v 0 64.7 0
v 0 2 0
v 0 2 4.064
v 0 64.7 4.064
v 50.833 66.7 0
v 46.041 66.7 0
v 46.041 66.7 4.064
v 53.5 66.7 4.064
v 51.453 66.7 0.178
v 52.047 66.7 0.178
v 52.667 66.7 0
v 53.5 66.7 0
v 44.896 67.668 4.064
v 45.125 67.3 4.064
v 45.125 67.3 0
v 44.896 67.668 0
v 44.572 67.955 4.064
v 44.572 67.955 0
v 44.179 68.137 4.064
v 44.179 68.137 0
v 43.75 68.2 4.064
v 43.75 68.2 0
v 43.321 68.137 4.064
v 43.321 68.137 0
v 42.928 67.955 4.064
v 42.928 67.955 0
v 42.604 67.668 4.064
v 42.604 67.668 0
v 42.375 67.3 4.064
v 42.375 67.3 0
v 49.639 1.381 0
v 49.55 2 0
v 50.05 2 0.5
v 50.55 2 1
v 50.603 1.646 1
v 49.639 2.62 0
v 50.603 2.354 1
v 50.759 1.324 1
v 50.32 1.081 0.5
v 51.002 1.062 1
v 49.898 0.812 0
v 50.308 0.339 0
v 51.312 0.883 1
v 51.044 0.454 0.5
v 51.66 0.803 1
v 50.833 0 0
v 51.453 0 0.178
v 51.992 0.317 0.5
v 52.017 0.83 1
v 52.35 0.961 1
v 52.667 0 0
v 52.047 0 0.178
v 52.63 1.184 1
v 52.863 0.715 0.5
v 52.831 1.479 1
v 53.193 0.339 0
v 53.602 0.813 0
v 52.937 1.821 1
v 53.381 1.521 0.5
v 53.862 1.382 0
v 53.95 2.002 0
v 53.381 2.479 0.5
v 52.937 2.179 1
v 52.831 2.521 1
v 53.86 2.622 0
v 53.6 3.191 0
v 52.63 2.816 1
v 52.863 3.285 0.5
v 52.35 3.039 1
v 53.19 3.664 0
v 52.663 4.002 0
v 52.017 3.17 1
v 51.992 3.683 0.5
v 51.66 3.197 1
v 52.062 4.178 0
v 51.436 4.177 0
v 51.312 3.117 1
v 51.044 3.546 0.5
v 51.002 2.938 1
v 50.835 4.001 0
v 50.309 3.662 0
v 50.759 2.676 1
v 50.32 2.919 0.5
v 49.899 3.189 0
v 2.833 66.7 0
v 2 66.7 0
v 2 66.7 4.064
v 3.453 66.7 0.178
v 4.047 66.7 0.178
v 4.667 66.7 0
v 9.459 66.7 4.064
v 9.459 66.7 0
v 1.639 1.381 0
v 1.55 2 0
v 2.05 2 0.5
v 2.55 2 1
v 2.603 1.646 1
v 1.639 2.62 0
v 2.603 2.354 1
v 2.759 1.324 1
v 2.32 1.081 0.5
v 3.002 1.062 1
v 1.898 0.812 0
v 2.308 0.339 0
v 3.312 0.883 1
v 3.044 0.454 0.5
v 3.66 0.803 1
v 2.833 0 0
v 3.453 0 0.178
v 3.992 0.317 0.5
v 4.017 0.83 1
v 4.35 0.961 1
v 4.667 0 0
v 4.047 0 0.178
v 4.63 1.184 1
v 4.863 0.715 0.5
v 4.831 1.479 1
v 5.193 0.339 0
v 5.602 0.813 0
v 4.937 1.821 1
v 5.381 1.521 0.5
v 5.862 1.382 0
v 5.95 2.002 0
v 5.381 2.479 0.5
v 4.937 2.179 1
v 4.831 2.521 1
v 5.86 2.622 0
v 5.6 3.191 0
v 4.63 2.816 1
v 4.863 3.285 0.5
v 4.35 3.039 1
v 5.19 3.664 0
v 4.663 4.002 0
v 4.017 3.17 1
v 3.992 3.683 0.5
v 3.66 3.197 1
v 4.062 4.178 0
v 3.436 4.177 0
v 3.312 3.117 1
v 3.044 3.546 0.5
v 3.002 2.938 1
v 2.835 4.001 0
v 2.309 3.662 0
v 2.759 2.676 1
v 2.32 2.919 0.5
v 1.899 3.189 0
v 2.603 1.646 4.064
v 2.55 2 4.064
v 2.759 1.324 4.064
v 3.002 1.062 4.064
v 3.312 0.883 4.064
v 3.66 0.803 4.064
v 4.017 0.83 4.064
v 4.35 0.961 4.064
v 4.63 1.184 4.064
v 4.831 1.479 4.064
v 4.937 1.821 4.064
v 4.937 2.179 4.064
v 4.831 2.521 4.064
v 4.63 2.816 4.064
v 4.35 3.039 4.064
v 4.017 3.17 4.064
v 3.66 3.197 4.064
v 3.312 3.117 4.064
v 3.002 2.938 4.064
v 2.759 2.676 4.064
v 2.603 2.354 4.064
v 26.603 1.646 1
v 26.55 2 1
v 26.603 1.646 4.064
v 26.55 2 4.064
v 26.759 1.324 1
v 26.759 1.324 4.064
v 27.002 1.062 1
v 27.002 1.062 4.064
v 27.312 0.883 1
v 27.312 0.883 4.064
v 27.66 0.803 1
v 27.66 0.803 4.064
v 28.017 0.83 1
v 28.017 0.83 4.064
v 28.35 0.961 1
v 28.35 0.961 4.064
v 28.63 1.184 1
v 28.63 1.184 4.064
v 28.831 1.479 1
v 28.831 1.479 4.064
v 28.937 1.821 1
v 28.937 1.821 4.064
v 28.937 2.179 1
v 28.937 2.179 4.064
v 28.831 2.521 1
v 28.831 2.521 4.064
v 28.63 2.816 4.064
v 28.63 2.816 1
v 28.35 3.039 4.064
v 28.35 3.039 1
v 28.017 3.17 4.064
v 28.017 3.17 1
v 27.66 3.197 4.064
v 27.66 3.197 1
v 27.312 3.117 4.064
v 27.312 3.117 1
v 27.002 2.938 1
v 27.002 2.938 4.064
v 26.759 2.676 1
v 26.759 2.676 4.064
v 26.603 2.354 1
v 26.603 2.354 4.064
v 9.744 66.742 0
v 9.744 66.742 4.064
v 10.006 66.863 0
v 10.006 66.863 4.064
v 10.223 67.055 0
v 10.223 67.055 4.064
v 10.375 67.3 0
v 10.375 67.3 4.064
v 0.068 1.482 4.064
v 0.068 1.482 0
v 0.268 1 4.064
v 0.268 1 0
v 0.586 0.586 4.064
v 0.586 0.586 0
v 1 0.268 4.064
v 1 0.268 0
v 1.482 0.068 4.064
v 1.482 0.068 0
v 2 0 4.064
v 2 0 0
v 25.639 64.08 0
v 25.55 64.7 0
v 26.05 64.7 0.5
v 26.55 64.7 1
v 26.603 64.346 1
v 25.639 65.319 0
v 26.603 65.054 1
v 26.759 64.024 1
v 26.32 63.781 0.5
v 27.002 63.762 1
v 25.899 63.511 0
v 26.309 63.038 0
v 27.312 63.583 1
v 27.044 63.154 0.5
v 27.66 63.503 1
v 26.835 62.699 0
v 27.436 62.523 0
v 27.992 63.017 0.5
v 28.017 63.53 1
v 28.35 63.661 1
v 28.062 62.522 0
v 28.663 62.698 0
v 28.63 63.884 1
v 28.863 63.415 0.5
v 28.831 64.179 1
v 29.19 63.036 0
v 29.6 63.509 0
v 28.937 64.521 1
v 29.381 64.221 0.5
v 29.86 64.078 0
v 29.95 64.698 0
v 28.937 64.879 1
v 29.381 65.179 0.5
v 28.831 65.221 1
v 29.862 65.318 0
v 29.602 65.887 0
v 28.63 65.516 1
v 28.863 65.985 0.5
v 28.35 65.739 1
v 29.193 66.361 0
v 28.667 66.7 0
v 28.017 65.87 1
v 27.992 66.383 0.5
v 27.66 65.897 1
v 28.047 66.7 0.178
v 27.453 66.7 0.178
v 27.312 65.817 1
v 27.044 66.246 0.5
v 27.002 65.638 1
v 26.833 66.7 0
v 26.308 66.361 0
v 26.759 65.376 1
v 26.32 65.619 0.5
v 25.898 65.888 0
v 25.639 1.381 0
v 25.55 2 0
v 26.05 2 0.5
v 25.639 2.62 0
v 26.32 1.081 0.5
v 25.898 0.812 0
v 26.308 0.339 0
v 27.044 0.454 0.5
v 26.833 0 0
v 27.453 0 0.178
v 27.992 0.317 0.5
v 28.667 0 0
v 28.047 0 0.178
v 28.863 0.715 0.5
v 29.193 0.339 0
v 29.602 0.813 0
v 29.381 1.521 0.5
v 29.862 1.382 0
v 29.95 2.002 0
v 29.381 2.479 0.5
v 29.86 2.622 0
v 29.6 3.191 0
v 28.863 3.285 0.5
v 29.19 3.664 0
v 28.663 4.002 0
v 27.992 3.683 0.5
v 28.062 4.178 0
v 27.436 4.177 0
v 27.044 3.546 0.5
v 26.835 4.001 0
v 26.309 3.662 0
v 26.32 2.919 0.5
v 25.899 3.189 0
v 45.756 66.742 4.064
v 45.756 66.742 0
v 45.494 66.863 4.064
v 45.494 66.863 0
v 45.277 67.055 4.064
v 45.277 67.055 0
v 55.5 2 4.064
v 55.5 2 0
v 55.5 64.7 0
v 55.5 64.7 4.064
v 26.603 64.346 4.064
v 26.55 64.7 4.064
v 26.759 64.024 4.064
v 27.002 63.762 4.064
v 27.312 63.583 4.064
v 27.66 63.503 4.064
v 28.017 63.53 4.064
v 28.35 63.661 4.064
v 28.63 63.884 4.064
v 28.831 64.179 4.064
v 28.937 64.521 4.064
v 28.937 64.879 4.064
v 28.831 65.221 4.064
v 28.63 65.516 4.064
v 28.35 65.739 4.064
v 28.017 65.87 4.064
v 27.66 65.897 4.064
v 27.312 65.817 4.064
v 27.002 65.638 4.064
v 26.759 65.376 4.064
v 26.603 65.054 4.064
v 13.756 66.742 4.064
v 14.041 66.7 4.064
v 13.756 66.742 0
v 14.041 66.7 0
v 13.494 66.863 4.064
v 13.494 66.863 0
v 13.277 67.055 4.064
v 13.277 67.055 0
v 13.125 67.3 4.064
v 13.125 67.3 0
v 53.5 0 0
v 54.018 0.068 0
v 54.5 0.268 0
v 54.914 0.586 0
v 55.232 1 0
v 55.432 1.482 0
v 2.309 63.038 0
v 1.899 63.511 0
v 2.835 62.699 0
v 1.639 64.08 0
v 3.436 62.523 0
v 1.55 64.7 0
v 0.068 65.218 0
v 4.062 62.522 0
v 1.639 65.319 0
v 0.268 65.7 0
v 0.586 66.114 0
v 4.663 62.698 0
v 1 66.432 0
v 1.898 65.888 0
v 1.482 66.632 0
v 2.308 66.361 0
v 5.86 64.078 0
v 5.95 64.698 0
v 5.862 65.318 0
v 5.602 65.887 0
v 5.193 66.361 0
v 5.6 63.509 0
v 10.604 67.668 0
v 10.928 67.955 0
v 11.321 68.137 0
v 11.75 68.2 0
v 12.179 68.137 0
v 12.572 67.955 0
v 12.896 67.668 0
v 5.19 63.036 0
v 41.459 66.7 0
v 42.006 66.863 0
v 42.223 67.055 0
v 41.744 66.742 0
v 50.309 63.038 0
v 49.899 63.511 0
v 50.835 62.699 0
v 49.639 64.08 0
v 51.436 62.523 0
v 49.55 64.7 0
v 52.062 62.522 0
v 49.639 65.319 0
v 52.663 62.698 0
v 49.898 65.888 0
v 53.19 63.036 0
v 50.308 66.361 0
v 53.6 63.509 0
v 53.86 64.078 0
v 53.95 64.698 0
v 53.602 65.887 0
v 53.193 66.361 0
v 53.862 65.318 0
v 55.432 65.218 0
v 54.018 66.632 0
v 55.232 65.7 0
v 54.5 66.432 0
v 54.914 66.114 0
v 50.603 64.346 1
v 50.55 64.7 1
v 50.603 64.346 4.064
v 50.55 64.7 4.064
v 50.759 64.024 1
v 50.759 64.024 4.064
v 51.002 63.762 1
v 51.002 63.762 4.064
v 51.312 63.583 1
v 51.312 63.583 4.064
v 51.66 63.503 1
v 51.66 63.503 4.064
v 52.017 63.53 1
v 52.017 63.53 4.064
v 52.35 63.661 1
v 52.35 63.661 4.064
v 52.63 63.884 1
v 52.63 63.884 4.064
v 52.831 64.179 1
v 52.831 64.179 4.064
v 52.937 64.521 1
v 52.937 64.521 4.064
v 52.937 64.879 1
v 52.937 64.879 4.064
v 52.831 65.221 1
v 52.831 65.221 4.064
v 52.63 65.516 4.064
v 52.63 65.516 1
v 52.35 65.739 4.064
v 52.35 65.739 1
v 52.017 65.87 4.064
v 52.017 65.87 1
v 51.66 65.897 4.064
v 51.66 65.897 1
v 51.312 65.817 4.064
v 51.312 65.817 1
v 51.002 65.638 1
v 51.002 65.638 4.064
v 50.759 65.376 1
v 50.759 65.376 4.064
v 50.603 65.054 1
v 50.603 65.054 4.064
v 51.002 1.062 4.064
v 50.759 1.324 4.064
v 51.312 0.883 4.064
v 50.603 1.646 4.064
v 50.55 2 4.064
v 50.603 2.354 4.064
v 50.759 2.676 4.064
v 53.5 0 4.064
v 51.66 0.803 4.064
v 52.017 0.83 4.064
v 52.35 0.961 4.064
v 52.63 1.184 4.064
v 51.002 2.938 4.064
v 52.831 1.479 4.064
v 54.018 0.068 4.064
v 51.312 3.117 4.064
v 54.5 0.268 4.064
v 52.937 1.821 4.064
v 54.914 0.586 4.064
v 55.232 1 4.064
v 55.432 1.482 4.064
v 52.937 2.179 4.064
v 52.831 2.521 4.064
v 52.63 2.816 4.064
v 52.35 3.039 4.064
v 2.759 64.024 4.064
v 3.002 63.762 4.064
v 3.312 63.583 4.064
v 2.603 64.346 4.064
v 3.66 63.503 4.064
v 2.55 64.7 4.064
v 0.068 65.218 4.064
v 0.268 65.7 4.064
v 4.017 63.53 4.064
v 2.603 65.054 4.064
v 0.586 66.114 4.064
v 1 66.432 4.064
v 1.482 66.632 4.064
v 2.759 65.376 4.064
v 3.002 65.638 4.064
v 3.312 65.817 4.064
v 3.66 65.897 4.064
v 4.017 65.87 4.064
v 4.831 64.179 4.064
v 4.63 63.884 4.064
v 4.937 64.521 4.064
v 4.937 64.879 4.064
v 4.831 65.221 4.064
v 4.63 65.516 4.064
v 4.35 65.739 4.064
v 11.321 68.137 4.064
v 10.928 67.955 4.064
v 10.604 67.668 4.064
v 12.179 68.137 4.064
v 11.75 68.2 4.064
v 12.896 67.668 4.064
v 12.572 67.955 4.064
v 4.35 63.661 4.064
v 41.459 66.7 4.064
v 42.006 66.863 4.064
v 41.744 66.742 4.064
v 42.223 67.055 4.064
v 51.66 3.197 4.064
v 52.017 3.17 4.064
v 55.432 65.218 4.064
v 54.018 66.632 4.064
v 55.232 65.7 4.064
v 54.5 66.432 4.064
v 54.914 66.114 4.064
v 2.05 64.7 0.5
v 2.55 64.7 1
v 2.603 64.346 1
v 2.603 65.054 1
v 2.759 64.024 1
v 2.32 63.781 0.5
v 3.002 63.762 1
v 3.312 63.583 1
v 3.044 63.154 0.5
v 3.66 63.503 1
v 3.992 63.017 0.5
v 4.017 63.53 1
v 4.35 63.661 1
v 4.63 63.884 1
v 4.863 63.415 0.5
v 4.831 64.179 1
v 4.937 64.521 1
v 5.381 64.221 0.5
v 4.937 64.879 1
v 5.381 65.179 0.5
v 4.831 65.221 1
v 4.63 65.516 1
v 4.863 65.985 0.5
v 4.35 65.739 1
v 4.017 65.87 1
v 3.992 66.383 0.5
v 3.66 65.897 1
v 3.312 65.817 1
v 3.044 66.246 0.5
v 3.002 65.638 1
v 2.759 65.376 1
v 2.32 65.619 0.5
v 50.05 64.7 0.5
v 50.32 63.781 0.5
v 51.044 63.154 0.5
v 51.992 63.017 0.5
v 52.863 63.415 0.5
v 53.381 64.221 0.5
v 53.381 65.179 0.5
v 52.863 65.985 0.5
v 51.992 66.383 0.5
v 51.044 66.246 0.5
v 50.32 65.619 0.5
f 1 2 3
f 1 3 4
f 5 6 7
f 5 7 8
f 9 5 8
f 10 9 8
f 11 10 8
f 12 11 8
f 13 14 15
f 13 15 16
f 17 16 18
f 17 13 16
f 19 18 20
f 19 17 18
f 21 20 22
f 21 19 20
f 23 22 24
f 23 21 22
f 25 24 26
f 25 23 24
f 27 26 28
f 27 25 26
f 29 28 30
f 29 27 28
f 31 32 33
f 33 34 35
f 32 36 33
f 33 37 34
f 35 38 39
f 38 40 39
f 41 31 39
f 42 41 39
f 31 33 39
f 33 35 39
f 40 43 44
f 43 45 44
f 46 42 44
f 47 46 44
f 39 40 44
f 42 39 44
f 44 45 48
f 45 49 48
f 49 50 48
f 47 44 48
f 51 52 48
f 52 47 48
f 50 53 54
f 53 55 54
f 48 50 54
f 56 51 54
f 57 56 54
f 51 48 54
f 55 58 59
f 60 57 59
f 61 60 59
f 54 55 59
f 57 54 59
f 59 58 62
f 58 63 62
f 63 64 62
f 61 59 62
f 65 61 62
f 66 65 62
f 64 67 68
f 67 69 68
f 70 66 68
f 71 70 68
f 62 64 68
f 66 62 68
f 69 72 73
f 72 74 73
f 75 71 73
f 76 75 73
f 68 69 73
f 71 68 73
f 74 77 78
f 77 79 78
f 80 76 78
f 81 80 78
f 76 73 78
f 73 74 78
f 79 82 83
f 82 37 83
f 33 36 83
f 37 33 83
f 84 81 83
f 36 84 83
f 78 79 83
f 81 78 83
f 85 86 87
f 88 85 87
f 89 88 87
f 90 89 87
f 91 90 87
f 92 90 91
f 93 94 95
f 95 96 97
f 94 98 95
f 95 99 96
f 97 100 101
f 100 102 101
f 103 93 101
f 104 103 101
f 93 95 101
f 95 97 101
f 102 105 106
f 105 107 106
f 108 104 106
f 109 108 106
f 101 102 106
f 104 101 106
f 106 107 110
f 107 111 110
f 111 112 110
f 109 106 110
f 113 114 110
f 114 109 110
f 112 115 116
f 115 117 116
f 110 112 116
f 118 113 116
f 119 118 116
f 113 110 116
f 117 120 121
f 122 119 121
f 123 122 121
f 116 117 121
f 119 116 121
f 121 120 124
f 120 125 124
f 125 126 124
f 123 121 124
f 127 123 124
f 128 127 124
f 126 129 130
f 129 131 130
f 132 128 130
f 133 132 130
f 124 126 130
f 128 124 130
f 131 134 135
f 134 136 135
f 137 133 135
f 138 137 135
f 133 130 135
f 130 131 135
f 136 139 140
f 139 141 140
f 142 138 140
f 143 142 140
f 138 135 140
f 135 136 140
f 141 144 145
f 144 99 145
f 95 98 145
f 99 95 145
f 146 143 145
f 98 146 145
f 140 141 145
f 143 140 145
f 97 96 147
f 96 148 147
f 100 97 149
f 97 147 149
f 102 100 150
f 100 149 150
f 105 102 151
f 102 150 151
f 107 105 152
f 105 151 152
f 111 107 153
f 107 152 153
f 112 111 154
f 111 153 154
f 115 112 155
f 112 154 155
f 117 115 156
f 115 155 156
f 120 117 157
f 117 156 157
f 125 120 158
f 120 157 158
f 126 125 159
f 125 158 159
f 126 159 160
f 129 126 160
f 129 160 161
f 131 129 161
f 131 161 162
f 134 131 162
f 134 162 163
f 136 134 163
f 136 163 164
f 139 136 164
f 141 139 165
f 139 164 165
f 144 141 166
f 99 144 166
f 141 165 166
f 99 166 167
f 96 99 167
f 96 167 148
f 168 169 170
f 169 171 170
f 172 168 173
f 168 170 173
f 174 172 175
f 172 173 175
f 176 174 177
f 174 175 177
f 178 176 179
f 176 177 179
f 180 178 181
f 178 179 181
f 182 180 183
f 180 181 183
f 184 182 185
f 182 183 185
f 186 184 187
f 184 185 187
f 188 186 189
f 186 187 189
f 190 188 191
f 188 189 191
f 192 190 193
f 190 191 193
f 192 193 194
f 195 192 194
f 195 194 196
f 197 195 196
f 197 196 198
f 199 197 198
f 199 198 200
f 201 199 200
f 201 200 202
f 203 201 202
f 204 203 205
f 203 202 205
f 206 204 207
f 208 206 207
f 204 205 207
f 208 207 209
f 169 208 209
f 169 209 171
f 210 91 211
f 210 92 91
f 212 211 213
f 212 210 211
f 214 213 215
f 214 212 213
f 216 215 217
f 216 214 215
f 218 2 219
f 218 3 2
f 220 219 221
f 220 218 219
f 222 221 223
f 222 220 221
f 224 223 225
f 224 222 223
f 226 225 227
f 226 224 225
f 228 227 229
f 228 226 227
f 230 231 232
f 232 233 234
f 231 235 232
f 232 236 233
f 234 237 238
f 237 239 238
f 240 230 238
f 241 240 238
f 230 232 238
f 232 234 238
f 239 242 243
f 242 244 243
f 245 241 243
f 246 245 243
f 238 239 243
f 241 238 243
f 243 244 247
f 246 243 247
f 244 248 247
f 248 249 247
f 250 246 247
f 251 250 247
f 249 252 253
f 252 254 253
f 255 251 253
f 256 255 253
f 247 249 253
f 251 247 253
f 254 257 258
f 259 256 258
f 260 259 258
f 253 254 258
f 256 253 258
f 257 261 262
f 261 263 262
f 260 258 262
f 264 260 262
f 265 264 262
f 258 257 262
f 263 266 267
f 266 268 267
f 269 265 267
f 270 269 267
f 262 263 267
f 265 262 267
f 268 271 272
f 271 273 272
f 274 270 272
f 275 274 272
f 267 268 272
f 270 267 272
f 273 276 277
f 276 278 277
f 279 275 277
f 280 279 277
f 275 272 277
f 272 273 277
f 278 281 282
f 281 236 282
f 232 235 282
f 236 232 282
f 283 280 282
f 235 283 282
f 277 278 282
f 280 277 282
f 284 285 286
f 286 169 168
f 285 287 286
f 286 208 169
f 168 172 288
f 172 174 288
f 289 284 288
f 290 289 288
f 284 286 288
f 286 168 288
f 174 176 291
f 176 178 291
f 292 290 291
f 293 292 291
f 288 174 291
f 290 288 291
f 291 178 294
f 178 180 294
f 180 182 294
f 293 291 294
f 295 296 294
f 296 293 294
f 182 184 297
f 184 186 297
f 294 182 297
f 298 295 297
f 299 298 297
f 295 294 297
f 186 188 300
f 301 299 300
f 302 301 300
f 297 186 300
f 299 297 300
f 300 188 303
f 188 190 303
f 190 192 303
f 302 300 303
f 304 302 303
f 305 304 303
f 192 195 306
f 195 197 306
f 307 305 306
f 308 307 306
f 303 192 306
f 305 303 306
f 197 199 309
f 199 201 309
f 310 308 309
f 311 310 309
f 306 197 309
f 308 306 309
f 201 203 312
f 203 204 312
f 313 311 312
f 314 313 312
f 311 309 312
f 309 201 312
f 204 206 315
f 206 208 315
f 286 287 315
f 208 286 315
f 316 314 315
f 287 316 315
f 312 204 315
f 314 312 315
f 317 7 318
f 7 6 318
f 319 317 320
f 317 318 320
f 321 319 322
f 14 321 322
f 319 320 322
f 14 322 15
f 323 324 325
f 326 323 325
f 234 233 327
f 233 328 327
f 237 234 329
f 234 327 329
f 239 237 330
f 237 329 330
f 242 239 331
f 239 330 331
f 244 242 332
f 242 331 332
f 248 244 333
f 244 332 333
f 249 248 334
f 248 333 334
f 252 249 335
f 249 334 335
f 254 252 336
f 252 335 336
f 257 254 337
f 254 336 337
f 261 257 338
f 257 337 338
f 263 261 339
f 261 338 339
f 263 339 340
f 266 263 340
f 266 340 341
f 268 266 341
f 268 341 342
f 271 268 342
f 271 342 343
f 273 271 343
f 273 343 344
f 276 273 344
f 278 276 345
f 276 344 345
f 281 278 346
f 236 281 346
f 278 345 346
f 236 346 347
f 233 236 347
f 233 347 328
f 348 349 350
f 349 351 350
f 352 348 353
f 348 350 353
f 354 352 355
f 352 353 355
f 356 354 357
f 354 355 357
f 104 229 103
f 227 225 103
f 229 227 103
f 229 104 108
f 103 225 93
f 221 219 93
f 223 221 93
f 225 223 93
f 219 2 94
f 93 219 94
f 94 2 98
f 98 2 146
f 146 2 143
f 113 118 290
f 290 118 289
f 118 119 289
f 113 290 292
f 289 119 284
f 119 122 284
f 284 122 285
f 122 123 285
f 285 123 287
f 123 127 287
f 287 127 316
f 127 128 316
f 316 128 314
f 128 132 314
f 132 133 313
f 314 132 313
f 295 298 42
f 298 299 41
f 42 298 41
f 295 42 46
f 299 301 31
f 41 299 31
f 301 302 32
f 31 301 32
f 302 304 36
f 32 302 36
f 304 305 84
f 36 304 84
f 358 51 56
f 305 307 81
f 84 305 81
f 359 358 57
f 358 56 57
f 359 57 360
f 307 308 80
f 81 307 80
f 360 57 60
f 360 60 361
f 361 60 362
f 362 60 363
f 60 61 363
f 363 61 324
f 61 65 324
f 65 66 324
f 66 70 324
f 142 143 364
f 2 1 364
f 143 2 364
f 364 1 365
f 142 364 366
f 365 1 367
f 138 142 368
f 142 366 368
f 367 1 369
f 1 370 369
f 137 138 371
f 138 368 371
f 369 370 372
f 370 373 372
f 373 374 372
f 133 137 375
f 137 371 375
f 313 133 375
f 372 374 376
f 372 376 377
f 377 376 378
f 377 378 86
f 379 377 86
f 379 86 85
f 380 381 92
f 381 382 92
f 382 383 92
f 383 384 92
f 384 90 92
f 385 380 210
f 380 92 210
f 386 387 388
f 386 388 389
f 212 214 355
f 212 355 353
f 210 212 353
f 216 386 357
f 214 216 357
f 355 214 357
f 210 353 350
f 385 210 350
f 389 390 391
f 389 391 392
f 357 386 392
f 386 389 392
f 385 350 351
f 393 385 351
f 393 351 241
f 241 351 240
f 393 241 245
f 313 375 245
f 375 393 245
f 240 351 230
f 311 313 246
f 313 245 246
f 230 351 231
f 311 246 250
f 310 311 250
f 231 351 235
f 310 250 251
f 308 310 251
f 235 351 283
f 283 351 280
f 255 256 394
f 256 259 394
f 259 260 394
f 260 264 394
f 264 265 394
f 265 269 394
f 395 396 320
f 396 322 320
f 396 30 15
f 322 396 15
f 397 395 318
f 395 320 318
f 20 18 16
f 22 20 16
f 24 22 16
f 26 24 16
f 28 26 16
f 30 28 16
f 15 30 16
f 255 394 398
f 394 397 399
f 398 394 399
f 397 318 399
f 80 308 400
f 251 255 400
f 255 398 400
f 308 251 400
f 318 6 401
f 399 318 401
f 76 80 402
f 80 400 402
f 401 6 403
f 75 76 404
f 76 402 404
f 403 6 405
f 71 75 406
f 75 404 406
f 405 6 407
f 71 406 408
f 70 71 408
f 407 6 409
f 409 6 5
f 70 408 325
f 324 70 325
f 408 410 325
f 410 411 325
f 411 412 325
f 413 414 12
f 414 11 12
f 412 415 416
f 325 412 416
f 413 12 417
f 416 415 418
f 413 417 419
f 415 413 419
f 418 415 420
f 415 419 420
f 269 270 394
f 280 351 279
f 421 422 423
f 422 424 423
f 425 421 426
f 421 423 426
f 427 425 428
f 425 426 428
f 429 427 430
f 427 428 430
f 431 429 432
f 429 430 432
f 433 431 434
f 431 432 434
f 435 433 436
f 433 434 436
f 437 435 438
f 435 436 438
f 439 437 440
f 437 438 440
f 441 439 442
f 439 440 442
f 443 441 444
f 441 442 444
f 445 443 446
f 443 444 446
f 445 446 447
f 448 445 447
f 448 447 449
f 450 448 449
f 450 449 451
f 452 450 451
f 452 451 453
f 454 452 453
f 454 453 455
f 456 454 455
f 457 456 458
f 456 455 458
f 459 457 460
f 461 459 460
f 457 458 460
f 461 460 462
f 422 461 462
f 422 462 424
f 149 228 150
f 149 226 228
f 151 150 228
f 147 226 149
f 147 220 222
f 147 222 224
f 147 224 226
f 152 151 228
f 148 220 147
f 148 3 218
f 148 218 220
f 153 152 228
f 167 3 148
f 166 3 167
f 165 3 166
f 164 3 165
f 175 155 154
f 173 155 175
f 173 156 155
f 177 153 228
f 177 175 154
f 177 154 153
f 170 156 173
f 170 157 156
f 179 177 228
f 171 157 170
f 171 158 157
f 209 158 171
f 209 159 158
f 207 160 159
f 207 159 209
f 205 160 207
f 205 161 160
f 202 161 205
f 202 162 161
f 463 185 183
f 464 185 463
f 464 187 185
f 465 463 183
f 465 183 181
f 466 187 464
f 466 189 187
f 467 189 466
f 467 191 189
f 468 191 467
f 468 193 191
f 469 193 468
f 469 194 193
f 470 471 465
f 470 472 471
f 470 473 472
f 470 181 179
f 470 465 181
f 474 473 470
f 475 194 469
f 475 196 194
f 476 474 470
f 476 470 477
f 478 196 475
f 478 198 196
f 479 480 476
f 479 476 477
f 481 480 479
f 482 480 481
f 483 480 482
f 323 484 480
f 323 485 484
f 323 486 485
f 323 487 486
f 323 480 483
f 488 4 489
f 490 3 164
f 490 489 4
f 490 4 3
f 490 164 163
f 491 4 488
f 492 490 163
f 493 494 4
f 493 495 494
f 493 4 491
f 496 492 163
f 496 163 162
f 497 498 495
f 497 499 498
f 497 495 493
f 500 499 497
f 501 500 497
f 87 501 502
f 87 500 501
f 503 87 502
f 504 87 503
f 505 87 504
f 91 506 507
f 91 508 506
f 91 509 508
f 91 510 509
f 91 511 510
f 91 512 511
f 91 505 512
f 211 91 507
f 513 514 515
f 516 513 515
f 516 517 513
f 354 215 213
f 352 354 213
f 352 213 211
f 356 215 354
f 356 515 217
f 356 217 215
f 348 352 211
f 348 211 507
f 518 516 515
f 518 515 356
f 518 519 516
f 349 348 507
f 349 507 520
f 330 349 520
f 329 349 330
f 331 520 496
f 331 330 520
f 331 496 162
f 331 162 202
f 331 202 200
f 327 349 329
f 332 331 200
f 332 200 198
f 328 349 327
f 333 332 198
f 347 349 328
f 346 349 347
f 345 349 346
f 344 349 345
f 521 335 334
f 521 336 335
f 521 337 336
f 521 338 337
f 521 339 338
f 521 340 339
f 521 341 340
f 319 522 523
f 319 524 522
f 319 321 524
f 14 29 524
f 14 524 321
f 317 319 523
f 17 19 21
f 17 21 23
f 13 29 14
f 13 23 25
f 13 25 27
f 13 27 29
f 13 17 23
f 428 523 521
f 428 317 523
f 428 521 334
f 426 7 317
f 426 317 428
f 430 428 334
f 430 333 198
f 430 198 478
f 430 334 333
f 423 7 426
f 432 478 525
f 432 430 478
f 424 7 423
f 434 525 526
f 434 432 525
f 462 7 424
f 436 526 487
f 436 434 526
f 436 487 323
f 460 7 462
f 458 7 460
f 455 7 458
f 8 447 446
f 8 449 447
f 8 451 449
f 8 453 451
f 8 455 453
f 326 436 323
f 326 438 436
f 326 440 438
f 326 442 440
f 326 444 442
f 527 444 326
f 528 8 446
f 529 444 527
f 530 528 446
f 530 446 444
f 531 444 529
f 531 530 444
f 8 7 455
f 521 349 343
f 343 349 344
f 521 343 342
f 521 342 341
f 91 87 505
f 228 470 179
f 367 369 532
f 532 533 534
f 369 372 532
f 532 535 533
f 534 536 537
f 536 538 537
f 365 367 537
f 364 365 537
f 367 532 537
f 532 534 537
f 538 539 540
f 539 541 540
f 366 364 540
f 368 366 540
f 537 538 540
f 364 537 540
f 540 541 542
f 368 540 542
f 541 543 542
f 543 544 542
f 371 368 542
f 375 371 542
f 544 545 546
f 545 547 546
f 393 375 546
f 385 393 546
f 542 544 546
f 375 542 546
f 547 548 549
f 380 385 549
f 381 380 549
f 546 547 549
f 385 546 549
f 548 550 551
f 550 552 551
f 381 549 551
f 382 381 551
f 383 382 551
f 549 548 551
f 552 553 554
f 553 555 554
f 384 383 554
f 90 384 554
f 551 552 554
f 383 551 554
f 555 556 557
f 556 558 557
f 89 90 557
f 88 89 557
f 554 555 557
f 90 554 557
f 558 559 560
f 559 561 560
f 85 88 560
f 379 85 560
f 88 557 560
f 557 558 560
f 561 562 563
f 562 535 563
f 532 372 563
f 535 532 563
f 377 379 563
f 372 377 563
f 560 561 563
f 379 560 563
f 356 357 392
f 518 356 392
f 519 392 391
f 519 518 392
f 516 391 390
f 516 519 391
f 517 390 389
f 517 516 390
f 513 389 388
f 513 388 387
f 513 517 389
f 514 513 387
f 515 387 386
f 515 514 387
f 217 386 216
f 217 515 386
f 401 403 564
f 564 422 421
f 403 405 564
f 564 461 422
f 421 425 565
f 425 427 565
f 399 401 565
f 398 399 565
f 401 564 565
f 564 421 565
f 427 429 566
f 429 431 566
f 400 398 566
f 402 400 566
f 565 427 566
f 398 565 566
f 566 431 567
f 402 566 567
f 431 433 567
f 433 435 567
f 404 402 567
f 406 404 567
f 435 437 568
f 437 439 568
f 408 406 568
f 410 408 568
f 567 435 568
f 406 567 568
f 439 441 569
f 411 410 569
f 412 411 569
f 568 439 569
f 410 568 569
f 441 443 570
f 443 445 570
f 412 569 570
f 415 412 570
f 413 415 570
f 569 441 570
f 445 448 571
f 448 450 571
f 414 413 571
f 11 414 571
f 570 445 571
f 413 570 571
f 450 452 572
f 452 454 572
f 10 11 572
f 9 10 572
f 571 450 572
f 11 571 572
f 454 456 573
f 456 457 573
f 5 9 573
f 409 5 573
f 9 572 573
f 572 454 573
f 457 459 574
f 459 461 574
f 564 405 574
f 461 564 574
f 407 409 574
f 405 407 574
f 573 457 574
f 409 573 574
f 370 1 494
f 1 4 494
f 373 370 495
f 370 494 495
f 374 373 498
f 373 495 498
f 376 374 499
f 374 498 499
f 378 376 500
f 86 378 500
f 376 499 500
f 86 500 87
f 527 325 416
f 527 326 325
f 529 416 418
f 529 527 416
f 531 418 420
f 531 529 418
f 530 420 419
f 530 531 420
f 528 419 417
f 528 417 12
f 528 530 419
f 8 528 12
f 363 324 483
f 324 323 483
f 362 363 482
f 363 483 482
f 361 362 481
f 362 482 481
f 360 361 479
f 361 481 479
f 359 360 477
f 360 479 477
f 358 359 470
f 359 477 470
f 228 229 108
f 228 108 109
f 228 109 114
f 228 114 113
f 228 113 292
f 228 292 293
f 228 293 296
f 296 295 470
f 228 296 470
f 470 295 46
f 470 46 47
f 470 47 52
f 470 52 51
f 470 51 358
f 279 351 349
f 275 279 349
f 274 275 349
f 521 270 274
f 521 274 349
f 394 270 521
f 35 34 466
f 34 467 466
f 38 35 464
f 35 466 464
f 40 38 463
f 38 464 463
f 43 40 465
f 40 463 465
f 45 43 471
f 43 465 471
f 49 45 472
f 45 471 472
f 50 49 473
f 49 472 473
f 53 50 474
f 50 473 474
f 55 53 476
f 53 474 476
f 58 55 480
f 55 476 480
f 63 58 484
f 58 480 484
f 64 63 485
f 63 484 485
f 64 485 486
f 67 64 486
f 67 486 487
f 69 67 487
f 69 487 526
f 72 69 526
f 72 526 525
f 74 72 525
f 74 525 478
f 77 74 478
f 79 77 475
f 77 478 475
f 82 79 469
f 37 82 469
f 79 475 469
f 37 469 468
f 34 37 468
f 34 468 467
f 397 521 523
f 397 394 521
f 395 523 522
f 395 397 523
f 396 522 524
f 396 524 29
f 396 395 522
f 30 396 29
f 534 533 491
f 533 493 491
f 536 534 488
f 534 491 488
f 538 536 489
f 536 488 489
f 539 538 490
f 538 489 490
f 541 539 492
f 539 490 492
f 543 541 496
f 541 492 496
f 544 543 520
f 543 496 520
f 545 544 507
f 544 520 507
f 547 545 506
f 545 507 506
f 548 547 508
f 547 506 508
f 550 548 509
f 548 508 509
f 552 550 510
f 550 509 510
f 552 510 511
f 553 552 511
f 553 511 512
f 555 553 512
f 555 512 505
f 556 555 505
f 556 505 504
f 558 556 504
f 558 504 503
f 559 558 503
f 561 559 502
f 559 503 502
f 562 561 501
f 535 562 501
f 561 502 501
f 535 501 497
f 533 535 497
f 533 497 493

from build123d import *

# Parameters (mm, degrees)
SKETCH1_W                                       = 55.5
SKETCH1_H                                       = 66.7
BOSS_EXTRUDE1_DEPTH                             = 4.064
CSK_FOR_M2_FLAT_HEAD_MACHINE_SCREW3_D           = 2.4
CSK_FOR_M2_FLAT_HEAD_MACHINE_SCREW3_CSINK_D     = 4.4
CSK_FOR_M2_FLAT_HEAD_MACHINE_SCREW3_CSINK_ANGLE = 90
FILLET1_R                                       = 2
BOSS_EXTRUDE3_DEPTH                             = 4.064
FILLET2_R                                       = 1


with BuildPart() as part:
    # Sketch1 → Boss-Extrude1 (new body)
    with BuildSketch(Plane.XY):
        with Locations((27.75, 33.35)):
            Rectangle(SKETCH1_W, SKETCH1_H)
    extrude(amount=BOSS_EXTRUDE1_DEPTH)

    # CSK for M2 Flat Head Machine Screw3 (through all)
    with Locations(Plane(origin=(2.783474674, 10.392611329, 0), x_dir=(1, 0, 0), z_dir=(0, 0, -1))):
        with Locations((0.966525326, -54.307388671), (24.966525326, -54.307388671), (48.966525326, -54.307388671), (0.966525326, 8.392611329), (24.966525326, 8.392611329), (48.966525326, 8.392611329)):
            CounterSinkHole(CSK_FOR_M2_FLAT_HEAD_MACHINE_SCREW3_D / 2, CSK_FOR_M2_FLAT_HEAD_MACHINE_SCREW3_CSINK_D / 2, counter_sink_angle=CSK_FOR_M2_FLAT_HEAD_MACHINE_SCREW3_CSINK_ANGLE)

    # Fillet1
    fillet1_edges = [part.edges().sort_by_distance(p)[0] for p in [
        (0, 66.7, 2.032),
        (55.5, 66.7, 2.032),
        (55.5, 0, 2.032),
        (0, 0, 2.032),
    ]]
    fillet(fillet1_edges, radius=FILLET1_R)

    # Sketch7 → Boss-Extrude3 (add, through all)
    with BuildSketch(Plane.XY.offset(4.064)):
        with BuildLine():
            Line((10.25, 66.7), (13.25, 66.7))
            ThreePointArc((13.25, 66.7), (11.75, 68.2), (10.25, 66.7))
        make_face()
        with BuildLine():
            Line((42.25, 66.7), (45.25, 66.7))
            ThreePointArc((45.25, 66.7), (43.75, 68.2), (42.25, 66.7))
        make_face()
    extrude(amount=-BOSS_EXTRUDE3_DEPTH)

    # Fillet2
    fillet2_edges = [part.edges().sort_by_distance(p)[0] for p in [
        (10.25, 66.7, 2.032),
        (13.25, 66.7, 2.032),
        (42.25, 66.7, 2.032),
        (45.25, 66.7, 2.032),
    ]]
    fillet(fillet2_edges, radius=FILLET2_R)


solid = part.part
